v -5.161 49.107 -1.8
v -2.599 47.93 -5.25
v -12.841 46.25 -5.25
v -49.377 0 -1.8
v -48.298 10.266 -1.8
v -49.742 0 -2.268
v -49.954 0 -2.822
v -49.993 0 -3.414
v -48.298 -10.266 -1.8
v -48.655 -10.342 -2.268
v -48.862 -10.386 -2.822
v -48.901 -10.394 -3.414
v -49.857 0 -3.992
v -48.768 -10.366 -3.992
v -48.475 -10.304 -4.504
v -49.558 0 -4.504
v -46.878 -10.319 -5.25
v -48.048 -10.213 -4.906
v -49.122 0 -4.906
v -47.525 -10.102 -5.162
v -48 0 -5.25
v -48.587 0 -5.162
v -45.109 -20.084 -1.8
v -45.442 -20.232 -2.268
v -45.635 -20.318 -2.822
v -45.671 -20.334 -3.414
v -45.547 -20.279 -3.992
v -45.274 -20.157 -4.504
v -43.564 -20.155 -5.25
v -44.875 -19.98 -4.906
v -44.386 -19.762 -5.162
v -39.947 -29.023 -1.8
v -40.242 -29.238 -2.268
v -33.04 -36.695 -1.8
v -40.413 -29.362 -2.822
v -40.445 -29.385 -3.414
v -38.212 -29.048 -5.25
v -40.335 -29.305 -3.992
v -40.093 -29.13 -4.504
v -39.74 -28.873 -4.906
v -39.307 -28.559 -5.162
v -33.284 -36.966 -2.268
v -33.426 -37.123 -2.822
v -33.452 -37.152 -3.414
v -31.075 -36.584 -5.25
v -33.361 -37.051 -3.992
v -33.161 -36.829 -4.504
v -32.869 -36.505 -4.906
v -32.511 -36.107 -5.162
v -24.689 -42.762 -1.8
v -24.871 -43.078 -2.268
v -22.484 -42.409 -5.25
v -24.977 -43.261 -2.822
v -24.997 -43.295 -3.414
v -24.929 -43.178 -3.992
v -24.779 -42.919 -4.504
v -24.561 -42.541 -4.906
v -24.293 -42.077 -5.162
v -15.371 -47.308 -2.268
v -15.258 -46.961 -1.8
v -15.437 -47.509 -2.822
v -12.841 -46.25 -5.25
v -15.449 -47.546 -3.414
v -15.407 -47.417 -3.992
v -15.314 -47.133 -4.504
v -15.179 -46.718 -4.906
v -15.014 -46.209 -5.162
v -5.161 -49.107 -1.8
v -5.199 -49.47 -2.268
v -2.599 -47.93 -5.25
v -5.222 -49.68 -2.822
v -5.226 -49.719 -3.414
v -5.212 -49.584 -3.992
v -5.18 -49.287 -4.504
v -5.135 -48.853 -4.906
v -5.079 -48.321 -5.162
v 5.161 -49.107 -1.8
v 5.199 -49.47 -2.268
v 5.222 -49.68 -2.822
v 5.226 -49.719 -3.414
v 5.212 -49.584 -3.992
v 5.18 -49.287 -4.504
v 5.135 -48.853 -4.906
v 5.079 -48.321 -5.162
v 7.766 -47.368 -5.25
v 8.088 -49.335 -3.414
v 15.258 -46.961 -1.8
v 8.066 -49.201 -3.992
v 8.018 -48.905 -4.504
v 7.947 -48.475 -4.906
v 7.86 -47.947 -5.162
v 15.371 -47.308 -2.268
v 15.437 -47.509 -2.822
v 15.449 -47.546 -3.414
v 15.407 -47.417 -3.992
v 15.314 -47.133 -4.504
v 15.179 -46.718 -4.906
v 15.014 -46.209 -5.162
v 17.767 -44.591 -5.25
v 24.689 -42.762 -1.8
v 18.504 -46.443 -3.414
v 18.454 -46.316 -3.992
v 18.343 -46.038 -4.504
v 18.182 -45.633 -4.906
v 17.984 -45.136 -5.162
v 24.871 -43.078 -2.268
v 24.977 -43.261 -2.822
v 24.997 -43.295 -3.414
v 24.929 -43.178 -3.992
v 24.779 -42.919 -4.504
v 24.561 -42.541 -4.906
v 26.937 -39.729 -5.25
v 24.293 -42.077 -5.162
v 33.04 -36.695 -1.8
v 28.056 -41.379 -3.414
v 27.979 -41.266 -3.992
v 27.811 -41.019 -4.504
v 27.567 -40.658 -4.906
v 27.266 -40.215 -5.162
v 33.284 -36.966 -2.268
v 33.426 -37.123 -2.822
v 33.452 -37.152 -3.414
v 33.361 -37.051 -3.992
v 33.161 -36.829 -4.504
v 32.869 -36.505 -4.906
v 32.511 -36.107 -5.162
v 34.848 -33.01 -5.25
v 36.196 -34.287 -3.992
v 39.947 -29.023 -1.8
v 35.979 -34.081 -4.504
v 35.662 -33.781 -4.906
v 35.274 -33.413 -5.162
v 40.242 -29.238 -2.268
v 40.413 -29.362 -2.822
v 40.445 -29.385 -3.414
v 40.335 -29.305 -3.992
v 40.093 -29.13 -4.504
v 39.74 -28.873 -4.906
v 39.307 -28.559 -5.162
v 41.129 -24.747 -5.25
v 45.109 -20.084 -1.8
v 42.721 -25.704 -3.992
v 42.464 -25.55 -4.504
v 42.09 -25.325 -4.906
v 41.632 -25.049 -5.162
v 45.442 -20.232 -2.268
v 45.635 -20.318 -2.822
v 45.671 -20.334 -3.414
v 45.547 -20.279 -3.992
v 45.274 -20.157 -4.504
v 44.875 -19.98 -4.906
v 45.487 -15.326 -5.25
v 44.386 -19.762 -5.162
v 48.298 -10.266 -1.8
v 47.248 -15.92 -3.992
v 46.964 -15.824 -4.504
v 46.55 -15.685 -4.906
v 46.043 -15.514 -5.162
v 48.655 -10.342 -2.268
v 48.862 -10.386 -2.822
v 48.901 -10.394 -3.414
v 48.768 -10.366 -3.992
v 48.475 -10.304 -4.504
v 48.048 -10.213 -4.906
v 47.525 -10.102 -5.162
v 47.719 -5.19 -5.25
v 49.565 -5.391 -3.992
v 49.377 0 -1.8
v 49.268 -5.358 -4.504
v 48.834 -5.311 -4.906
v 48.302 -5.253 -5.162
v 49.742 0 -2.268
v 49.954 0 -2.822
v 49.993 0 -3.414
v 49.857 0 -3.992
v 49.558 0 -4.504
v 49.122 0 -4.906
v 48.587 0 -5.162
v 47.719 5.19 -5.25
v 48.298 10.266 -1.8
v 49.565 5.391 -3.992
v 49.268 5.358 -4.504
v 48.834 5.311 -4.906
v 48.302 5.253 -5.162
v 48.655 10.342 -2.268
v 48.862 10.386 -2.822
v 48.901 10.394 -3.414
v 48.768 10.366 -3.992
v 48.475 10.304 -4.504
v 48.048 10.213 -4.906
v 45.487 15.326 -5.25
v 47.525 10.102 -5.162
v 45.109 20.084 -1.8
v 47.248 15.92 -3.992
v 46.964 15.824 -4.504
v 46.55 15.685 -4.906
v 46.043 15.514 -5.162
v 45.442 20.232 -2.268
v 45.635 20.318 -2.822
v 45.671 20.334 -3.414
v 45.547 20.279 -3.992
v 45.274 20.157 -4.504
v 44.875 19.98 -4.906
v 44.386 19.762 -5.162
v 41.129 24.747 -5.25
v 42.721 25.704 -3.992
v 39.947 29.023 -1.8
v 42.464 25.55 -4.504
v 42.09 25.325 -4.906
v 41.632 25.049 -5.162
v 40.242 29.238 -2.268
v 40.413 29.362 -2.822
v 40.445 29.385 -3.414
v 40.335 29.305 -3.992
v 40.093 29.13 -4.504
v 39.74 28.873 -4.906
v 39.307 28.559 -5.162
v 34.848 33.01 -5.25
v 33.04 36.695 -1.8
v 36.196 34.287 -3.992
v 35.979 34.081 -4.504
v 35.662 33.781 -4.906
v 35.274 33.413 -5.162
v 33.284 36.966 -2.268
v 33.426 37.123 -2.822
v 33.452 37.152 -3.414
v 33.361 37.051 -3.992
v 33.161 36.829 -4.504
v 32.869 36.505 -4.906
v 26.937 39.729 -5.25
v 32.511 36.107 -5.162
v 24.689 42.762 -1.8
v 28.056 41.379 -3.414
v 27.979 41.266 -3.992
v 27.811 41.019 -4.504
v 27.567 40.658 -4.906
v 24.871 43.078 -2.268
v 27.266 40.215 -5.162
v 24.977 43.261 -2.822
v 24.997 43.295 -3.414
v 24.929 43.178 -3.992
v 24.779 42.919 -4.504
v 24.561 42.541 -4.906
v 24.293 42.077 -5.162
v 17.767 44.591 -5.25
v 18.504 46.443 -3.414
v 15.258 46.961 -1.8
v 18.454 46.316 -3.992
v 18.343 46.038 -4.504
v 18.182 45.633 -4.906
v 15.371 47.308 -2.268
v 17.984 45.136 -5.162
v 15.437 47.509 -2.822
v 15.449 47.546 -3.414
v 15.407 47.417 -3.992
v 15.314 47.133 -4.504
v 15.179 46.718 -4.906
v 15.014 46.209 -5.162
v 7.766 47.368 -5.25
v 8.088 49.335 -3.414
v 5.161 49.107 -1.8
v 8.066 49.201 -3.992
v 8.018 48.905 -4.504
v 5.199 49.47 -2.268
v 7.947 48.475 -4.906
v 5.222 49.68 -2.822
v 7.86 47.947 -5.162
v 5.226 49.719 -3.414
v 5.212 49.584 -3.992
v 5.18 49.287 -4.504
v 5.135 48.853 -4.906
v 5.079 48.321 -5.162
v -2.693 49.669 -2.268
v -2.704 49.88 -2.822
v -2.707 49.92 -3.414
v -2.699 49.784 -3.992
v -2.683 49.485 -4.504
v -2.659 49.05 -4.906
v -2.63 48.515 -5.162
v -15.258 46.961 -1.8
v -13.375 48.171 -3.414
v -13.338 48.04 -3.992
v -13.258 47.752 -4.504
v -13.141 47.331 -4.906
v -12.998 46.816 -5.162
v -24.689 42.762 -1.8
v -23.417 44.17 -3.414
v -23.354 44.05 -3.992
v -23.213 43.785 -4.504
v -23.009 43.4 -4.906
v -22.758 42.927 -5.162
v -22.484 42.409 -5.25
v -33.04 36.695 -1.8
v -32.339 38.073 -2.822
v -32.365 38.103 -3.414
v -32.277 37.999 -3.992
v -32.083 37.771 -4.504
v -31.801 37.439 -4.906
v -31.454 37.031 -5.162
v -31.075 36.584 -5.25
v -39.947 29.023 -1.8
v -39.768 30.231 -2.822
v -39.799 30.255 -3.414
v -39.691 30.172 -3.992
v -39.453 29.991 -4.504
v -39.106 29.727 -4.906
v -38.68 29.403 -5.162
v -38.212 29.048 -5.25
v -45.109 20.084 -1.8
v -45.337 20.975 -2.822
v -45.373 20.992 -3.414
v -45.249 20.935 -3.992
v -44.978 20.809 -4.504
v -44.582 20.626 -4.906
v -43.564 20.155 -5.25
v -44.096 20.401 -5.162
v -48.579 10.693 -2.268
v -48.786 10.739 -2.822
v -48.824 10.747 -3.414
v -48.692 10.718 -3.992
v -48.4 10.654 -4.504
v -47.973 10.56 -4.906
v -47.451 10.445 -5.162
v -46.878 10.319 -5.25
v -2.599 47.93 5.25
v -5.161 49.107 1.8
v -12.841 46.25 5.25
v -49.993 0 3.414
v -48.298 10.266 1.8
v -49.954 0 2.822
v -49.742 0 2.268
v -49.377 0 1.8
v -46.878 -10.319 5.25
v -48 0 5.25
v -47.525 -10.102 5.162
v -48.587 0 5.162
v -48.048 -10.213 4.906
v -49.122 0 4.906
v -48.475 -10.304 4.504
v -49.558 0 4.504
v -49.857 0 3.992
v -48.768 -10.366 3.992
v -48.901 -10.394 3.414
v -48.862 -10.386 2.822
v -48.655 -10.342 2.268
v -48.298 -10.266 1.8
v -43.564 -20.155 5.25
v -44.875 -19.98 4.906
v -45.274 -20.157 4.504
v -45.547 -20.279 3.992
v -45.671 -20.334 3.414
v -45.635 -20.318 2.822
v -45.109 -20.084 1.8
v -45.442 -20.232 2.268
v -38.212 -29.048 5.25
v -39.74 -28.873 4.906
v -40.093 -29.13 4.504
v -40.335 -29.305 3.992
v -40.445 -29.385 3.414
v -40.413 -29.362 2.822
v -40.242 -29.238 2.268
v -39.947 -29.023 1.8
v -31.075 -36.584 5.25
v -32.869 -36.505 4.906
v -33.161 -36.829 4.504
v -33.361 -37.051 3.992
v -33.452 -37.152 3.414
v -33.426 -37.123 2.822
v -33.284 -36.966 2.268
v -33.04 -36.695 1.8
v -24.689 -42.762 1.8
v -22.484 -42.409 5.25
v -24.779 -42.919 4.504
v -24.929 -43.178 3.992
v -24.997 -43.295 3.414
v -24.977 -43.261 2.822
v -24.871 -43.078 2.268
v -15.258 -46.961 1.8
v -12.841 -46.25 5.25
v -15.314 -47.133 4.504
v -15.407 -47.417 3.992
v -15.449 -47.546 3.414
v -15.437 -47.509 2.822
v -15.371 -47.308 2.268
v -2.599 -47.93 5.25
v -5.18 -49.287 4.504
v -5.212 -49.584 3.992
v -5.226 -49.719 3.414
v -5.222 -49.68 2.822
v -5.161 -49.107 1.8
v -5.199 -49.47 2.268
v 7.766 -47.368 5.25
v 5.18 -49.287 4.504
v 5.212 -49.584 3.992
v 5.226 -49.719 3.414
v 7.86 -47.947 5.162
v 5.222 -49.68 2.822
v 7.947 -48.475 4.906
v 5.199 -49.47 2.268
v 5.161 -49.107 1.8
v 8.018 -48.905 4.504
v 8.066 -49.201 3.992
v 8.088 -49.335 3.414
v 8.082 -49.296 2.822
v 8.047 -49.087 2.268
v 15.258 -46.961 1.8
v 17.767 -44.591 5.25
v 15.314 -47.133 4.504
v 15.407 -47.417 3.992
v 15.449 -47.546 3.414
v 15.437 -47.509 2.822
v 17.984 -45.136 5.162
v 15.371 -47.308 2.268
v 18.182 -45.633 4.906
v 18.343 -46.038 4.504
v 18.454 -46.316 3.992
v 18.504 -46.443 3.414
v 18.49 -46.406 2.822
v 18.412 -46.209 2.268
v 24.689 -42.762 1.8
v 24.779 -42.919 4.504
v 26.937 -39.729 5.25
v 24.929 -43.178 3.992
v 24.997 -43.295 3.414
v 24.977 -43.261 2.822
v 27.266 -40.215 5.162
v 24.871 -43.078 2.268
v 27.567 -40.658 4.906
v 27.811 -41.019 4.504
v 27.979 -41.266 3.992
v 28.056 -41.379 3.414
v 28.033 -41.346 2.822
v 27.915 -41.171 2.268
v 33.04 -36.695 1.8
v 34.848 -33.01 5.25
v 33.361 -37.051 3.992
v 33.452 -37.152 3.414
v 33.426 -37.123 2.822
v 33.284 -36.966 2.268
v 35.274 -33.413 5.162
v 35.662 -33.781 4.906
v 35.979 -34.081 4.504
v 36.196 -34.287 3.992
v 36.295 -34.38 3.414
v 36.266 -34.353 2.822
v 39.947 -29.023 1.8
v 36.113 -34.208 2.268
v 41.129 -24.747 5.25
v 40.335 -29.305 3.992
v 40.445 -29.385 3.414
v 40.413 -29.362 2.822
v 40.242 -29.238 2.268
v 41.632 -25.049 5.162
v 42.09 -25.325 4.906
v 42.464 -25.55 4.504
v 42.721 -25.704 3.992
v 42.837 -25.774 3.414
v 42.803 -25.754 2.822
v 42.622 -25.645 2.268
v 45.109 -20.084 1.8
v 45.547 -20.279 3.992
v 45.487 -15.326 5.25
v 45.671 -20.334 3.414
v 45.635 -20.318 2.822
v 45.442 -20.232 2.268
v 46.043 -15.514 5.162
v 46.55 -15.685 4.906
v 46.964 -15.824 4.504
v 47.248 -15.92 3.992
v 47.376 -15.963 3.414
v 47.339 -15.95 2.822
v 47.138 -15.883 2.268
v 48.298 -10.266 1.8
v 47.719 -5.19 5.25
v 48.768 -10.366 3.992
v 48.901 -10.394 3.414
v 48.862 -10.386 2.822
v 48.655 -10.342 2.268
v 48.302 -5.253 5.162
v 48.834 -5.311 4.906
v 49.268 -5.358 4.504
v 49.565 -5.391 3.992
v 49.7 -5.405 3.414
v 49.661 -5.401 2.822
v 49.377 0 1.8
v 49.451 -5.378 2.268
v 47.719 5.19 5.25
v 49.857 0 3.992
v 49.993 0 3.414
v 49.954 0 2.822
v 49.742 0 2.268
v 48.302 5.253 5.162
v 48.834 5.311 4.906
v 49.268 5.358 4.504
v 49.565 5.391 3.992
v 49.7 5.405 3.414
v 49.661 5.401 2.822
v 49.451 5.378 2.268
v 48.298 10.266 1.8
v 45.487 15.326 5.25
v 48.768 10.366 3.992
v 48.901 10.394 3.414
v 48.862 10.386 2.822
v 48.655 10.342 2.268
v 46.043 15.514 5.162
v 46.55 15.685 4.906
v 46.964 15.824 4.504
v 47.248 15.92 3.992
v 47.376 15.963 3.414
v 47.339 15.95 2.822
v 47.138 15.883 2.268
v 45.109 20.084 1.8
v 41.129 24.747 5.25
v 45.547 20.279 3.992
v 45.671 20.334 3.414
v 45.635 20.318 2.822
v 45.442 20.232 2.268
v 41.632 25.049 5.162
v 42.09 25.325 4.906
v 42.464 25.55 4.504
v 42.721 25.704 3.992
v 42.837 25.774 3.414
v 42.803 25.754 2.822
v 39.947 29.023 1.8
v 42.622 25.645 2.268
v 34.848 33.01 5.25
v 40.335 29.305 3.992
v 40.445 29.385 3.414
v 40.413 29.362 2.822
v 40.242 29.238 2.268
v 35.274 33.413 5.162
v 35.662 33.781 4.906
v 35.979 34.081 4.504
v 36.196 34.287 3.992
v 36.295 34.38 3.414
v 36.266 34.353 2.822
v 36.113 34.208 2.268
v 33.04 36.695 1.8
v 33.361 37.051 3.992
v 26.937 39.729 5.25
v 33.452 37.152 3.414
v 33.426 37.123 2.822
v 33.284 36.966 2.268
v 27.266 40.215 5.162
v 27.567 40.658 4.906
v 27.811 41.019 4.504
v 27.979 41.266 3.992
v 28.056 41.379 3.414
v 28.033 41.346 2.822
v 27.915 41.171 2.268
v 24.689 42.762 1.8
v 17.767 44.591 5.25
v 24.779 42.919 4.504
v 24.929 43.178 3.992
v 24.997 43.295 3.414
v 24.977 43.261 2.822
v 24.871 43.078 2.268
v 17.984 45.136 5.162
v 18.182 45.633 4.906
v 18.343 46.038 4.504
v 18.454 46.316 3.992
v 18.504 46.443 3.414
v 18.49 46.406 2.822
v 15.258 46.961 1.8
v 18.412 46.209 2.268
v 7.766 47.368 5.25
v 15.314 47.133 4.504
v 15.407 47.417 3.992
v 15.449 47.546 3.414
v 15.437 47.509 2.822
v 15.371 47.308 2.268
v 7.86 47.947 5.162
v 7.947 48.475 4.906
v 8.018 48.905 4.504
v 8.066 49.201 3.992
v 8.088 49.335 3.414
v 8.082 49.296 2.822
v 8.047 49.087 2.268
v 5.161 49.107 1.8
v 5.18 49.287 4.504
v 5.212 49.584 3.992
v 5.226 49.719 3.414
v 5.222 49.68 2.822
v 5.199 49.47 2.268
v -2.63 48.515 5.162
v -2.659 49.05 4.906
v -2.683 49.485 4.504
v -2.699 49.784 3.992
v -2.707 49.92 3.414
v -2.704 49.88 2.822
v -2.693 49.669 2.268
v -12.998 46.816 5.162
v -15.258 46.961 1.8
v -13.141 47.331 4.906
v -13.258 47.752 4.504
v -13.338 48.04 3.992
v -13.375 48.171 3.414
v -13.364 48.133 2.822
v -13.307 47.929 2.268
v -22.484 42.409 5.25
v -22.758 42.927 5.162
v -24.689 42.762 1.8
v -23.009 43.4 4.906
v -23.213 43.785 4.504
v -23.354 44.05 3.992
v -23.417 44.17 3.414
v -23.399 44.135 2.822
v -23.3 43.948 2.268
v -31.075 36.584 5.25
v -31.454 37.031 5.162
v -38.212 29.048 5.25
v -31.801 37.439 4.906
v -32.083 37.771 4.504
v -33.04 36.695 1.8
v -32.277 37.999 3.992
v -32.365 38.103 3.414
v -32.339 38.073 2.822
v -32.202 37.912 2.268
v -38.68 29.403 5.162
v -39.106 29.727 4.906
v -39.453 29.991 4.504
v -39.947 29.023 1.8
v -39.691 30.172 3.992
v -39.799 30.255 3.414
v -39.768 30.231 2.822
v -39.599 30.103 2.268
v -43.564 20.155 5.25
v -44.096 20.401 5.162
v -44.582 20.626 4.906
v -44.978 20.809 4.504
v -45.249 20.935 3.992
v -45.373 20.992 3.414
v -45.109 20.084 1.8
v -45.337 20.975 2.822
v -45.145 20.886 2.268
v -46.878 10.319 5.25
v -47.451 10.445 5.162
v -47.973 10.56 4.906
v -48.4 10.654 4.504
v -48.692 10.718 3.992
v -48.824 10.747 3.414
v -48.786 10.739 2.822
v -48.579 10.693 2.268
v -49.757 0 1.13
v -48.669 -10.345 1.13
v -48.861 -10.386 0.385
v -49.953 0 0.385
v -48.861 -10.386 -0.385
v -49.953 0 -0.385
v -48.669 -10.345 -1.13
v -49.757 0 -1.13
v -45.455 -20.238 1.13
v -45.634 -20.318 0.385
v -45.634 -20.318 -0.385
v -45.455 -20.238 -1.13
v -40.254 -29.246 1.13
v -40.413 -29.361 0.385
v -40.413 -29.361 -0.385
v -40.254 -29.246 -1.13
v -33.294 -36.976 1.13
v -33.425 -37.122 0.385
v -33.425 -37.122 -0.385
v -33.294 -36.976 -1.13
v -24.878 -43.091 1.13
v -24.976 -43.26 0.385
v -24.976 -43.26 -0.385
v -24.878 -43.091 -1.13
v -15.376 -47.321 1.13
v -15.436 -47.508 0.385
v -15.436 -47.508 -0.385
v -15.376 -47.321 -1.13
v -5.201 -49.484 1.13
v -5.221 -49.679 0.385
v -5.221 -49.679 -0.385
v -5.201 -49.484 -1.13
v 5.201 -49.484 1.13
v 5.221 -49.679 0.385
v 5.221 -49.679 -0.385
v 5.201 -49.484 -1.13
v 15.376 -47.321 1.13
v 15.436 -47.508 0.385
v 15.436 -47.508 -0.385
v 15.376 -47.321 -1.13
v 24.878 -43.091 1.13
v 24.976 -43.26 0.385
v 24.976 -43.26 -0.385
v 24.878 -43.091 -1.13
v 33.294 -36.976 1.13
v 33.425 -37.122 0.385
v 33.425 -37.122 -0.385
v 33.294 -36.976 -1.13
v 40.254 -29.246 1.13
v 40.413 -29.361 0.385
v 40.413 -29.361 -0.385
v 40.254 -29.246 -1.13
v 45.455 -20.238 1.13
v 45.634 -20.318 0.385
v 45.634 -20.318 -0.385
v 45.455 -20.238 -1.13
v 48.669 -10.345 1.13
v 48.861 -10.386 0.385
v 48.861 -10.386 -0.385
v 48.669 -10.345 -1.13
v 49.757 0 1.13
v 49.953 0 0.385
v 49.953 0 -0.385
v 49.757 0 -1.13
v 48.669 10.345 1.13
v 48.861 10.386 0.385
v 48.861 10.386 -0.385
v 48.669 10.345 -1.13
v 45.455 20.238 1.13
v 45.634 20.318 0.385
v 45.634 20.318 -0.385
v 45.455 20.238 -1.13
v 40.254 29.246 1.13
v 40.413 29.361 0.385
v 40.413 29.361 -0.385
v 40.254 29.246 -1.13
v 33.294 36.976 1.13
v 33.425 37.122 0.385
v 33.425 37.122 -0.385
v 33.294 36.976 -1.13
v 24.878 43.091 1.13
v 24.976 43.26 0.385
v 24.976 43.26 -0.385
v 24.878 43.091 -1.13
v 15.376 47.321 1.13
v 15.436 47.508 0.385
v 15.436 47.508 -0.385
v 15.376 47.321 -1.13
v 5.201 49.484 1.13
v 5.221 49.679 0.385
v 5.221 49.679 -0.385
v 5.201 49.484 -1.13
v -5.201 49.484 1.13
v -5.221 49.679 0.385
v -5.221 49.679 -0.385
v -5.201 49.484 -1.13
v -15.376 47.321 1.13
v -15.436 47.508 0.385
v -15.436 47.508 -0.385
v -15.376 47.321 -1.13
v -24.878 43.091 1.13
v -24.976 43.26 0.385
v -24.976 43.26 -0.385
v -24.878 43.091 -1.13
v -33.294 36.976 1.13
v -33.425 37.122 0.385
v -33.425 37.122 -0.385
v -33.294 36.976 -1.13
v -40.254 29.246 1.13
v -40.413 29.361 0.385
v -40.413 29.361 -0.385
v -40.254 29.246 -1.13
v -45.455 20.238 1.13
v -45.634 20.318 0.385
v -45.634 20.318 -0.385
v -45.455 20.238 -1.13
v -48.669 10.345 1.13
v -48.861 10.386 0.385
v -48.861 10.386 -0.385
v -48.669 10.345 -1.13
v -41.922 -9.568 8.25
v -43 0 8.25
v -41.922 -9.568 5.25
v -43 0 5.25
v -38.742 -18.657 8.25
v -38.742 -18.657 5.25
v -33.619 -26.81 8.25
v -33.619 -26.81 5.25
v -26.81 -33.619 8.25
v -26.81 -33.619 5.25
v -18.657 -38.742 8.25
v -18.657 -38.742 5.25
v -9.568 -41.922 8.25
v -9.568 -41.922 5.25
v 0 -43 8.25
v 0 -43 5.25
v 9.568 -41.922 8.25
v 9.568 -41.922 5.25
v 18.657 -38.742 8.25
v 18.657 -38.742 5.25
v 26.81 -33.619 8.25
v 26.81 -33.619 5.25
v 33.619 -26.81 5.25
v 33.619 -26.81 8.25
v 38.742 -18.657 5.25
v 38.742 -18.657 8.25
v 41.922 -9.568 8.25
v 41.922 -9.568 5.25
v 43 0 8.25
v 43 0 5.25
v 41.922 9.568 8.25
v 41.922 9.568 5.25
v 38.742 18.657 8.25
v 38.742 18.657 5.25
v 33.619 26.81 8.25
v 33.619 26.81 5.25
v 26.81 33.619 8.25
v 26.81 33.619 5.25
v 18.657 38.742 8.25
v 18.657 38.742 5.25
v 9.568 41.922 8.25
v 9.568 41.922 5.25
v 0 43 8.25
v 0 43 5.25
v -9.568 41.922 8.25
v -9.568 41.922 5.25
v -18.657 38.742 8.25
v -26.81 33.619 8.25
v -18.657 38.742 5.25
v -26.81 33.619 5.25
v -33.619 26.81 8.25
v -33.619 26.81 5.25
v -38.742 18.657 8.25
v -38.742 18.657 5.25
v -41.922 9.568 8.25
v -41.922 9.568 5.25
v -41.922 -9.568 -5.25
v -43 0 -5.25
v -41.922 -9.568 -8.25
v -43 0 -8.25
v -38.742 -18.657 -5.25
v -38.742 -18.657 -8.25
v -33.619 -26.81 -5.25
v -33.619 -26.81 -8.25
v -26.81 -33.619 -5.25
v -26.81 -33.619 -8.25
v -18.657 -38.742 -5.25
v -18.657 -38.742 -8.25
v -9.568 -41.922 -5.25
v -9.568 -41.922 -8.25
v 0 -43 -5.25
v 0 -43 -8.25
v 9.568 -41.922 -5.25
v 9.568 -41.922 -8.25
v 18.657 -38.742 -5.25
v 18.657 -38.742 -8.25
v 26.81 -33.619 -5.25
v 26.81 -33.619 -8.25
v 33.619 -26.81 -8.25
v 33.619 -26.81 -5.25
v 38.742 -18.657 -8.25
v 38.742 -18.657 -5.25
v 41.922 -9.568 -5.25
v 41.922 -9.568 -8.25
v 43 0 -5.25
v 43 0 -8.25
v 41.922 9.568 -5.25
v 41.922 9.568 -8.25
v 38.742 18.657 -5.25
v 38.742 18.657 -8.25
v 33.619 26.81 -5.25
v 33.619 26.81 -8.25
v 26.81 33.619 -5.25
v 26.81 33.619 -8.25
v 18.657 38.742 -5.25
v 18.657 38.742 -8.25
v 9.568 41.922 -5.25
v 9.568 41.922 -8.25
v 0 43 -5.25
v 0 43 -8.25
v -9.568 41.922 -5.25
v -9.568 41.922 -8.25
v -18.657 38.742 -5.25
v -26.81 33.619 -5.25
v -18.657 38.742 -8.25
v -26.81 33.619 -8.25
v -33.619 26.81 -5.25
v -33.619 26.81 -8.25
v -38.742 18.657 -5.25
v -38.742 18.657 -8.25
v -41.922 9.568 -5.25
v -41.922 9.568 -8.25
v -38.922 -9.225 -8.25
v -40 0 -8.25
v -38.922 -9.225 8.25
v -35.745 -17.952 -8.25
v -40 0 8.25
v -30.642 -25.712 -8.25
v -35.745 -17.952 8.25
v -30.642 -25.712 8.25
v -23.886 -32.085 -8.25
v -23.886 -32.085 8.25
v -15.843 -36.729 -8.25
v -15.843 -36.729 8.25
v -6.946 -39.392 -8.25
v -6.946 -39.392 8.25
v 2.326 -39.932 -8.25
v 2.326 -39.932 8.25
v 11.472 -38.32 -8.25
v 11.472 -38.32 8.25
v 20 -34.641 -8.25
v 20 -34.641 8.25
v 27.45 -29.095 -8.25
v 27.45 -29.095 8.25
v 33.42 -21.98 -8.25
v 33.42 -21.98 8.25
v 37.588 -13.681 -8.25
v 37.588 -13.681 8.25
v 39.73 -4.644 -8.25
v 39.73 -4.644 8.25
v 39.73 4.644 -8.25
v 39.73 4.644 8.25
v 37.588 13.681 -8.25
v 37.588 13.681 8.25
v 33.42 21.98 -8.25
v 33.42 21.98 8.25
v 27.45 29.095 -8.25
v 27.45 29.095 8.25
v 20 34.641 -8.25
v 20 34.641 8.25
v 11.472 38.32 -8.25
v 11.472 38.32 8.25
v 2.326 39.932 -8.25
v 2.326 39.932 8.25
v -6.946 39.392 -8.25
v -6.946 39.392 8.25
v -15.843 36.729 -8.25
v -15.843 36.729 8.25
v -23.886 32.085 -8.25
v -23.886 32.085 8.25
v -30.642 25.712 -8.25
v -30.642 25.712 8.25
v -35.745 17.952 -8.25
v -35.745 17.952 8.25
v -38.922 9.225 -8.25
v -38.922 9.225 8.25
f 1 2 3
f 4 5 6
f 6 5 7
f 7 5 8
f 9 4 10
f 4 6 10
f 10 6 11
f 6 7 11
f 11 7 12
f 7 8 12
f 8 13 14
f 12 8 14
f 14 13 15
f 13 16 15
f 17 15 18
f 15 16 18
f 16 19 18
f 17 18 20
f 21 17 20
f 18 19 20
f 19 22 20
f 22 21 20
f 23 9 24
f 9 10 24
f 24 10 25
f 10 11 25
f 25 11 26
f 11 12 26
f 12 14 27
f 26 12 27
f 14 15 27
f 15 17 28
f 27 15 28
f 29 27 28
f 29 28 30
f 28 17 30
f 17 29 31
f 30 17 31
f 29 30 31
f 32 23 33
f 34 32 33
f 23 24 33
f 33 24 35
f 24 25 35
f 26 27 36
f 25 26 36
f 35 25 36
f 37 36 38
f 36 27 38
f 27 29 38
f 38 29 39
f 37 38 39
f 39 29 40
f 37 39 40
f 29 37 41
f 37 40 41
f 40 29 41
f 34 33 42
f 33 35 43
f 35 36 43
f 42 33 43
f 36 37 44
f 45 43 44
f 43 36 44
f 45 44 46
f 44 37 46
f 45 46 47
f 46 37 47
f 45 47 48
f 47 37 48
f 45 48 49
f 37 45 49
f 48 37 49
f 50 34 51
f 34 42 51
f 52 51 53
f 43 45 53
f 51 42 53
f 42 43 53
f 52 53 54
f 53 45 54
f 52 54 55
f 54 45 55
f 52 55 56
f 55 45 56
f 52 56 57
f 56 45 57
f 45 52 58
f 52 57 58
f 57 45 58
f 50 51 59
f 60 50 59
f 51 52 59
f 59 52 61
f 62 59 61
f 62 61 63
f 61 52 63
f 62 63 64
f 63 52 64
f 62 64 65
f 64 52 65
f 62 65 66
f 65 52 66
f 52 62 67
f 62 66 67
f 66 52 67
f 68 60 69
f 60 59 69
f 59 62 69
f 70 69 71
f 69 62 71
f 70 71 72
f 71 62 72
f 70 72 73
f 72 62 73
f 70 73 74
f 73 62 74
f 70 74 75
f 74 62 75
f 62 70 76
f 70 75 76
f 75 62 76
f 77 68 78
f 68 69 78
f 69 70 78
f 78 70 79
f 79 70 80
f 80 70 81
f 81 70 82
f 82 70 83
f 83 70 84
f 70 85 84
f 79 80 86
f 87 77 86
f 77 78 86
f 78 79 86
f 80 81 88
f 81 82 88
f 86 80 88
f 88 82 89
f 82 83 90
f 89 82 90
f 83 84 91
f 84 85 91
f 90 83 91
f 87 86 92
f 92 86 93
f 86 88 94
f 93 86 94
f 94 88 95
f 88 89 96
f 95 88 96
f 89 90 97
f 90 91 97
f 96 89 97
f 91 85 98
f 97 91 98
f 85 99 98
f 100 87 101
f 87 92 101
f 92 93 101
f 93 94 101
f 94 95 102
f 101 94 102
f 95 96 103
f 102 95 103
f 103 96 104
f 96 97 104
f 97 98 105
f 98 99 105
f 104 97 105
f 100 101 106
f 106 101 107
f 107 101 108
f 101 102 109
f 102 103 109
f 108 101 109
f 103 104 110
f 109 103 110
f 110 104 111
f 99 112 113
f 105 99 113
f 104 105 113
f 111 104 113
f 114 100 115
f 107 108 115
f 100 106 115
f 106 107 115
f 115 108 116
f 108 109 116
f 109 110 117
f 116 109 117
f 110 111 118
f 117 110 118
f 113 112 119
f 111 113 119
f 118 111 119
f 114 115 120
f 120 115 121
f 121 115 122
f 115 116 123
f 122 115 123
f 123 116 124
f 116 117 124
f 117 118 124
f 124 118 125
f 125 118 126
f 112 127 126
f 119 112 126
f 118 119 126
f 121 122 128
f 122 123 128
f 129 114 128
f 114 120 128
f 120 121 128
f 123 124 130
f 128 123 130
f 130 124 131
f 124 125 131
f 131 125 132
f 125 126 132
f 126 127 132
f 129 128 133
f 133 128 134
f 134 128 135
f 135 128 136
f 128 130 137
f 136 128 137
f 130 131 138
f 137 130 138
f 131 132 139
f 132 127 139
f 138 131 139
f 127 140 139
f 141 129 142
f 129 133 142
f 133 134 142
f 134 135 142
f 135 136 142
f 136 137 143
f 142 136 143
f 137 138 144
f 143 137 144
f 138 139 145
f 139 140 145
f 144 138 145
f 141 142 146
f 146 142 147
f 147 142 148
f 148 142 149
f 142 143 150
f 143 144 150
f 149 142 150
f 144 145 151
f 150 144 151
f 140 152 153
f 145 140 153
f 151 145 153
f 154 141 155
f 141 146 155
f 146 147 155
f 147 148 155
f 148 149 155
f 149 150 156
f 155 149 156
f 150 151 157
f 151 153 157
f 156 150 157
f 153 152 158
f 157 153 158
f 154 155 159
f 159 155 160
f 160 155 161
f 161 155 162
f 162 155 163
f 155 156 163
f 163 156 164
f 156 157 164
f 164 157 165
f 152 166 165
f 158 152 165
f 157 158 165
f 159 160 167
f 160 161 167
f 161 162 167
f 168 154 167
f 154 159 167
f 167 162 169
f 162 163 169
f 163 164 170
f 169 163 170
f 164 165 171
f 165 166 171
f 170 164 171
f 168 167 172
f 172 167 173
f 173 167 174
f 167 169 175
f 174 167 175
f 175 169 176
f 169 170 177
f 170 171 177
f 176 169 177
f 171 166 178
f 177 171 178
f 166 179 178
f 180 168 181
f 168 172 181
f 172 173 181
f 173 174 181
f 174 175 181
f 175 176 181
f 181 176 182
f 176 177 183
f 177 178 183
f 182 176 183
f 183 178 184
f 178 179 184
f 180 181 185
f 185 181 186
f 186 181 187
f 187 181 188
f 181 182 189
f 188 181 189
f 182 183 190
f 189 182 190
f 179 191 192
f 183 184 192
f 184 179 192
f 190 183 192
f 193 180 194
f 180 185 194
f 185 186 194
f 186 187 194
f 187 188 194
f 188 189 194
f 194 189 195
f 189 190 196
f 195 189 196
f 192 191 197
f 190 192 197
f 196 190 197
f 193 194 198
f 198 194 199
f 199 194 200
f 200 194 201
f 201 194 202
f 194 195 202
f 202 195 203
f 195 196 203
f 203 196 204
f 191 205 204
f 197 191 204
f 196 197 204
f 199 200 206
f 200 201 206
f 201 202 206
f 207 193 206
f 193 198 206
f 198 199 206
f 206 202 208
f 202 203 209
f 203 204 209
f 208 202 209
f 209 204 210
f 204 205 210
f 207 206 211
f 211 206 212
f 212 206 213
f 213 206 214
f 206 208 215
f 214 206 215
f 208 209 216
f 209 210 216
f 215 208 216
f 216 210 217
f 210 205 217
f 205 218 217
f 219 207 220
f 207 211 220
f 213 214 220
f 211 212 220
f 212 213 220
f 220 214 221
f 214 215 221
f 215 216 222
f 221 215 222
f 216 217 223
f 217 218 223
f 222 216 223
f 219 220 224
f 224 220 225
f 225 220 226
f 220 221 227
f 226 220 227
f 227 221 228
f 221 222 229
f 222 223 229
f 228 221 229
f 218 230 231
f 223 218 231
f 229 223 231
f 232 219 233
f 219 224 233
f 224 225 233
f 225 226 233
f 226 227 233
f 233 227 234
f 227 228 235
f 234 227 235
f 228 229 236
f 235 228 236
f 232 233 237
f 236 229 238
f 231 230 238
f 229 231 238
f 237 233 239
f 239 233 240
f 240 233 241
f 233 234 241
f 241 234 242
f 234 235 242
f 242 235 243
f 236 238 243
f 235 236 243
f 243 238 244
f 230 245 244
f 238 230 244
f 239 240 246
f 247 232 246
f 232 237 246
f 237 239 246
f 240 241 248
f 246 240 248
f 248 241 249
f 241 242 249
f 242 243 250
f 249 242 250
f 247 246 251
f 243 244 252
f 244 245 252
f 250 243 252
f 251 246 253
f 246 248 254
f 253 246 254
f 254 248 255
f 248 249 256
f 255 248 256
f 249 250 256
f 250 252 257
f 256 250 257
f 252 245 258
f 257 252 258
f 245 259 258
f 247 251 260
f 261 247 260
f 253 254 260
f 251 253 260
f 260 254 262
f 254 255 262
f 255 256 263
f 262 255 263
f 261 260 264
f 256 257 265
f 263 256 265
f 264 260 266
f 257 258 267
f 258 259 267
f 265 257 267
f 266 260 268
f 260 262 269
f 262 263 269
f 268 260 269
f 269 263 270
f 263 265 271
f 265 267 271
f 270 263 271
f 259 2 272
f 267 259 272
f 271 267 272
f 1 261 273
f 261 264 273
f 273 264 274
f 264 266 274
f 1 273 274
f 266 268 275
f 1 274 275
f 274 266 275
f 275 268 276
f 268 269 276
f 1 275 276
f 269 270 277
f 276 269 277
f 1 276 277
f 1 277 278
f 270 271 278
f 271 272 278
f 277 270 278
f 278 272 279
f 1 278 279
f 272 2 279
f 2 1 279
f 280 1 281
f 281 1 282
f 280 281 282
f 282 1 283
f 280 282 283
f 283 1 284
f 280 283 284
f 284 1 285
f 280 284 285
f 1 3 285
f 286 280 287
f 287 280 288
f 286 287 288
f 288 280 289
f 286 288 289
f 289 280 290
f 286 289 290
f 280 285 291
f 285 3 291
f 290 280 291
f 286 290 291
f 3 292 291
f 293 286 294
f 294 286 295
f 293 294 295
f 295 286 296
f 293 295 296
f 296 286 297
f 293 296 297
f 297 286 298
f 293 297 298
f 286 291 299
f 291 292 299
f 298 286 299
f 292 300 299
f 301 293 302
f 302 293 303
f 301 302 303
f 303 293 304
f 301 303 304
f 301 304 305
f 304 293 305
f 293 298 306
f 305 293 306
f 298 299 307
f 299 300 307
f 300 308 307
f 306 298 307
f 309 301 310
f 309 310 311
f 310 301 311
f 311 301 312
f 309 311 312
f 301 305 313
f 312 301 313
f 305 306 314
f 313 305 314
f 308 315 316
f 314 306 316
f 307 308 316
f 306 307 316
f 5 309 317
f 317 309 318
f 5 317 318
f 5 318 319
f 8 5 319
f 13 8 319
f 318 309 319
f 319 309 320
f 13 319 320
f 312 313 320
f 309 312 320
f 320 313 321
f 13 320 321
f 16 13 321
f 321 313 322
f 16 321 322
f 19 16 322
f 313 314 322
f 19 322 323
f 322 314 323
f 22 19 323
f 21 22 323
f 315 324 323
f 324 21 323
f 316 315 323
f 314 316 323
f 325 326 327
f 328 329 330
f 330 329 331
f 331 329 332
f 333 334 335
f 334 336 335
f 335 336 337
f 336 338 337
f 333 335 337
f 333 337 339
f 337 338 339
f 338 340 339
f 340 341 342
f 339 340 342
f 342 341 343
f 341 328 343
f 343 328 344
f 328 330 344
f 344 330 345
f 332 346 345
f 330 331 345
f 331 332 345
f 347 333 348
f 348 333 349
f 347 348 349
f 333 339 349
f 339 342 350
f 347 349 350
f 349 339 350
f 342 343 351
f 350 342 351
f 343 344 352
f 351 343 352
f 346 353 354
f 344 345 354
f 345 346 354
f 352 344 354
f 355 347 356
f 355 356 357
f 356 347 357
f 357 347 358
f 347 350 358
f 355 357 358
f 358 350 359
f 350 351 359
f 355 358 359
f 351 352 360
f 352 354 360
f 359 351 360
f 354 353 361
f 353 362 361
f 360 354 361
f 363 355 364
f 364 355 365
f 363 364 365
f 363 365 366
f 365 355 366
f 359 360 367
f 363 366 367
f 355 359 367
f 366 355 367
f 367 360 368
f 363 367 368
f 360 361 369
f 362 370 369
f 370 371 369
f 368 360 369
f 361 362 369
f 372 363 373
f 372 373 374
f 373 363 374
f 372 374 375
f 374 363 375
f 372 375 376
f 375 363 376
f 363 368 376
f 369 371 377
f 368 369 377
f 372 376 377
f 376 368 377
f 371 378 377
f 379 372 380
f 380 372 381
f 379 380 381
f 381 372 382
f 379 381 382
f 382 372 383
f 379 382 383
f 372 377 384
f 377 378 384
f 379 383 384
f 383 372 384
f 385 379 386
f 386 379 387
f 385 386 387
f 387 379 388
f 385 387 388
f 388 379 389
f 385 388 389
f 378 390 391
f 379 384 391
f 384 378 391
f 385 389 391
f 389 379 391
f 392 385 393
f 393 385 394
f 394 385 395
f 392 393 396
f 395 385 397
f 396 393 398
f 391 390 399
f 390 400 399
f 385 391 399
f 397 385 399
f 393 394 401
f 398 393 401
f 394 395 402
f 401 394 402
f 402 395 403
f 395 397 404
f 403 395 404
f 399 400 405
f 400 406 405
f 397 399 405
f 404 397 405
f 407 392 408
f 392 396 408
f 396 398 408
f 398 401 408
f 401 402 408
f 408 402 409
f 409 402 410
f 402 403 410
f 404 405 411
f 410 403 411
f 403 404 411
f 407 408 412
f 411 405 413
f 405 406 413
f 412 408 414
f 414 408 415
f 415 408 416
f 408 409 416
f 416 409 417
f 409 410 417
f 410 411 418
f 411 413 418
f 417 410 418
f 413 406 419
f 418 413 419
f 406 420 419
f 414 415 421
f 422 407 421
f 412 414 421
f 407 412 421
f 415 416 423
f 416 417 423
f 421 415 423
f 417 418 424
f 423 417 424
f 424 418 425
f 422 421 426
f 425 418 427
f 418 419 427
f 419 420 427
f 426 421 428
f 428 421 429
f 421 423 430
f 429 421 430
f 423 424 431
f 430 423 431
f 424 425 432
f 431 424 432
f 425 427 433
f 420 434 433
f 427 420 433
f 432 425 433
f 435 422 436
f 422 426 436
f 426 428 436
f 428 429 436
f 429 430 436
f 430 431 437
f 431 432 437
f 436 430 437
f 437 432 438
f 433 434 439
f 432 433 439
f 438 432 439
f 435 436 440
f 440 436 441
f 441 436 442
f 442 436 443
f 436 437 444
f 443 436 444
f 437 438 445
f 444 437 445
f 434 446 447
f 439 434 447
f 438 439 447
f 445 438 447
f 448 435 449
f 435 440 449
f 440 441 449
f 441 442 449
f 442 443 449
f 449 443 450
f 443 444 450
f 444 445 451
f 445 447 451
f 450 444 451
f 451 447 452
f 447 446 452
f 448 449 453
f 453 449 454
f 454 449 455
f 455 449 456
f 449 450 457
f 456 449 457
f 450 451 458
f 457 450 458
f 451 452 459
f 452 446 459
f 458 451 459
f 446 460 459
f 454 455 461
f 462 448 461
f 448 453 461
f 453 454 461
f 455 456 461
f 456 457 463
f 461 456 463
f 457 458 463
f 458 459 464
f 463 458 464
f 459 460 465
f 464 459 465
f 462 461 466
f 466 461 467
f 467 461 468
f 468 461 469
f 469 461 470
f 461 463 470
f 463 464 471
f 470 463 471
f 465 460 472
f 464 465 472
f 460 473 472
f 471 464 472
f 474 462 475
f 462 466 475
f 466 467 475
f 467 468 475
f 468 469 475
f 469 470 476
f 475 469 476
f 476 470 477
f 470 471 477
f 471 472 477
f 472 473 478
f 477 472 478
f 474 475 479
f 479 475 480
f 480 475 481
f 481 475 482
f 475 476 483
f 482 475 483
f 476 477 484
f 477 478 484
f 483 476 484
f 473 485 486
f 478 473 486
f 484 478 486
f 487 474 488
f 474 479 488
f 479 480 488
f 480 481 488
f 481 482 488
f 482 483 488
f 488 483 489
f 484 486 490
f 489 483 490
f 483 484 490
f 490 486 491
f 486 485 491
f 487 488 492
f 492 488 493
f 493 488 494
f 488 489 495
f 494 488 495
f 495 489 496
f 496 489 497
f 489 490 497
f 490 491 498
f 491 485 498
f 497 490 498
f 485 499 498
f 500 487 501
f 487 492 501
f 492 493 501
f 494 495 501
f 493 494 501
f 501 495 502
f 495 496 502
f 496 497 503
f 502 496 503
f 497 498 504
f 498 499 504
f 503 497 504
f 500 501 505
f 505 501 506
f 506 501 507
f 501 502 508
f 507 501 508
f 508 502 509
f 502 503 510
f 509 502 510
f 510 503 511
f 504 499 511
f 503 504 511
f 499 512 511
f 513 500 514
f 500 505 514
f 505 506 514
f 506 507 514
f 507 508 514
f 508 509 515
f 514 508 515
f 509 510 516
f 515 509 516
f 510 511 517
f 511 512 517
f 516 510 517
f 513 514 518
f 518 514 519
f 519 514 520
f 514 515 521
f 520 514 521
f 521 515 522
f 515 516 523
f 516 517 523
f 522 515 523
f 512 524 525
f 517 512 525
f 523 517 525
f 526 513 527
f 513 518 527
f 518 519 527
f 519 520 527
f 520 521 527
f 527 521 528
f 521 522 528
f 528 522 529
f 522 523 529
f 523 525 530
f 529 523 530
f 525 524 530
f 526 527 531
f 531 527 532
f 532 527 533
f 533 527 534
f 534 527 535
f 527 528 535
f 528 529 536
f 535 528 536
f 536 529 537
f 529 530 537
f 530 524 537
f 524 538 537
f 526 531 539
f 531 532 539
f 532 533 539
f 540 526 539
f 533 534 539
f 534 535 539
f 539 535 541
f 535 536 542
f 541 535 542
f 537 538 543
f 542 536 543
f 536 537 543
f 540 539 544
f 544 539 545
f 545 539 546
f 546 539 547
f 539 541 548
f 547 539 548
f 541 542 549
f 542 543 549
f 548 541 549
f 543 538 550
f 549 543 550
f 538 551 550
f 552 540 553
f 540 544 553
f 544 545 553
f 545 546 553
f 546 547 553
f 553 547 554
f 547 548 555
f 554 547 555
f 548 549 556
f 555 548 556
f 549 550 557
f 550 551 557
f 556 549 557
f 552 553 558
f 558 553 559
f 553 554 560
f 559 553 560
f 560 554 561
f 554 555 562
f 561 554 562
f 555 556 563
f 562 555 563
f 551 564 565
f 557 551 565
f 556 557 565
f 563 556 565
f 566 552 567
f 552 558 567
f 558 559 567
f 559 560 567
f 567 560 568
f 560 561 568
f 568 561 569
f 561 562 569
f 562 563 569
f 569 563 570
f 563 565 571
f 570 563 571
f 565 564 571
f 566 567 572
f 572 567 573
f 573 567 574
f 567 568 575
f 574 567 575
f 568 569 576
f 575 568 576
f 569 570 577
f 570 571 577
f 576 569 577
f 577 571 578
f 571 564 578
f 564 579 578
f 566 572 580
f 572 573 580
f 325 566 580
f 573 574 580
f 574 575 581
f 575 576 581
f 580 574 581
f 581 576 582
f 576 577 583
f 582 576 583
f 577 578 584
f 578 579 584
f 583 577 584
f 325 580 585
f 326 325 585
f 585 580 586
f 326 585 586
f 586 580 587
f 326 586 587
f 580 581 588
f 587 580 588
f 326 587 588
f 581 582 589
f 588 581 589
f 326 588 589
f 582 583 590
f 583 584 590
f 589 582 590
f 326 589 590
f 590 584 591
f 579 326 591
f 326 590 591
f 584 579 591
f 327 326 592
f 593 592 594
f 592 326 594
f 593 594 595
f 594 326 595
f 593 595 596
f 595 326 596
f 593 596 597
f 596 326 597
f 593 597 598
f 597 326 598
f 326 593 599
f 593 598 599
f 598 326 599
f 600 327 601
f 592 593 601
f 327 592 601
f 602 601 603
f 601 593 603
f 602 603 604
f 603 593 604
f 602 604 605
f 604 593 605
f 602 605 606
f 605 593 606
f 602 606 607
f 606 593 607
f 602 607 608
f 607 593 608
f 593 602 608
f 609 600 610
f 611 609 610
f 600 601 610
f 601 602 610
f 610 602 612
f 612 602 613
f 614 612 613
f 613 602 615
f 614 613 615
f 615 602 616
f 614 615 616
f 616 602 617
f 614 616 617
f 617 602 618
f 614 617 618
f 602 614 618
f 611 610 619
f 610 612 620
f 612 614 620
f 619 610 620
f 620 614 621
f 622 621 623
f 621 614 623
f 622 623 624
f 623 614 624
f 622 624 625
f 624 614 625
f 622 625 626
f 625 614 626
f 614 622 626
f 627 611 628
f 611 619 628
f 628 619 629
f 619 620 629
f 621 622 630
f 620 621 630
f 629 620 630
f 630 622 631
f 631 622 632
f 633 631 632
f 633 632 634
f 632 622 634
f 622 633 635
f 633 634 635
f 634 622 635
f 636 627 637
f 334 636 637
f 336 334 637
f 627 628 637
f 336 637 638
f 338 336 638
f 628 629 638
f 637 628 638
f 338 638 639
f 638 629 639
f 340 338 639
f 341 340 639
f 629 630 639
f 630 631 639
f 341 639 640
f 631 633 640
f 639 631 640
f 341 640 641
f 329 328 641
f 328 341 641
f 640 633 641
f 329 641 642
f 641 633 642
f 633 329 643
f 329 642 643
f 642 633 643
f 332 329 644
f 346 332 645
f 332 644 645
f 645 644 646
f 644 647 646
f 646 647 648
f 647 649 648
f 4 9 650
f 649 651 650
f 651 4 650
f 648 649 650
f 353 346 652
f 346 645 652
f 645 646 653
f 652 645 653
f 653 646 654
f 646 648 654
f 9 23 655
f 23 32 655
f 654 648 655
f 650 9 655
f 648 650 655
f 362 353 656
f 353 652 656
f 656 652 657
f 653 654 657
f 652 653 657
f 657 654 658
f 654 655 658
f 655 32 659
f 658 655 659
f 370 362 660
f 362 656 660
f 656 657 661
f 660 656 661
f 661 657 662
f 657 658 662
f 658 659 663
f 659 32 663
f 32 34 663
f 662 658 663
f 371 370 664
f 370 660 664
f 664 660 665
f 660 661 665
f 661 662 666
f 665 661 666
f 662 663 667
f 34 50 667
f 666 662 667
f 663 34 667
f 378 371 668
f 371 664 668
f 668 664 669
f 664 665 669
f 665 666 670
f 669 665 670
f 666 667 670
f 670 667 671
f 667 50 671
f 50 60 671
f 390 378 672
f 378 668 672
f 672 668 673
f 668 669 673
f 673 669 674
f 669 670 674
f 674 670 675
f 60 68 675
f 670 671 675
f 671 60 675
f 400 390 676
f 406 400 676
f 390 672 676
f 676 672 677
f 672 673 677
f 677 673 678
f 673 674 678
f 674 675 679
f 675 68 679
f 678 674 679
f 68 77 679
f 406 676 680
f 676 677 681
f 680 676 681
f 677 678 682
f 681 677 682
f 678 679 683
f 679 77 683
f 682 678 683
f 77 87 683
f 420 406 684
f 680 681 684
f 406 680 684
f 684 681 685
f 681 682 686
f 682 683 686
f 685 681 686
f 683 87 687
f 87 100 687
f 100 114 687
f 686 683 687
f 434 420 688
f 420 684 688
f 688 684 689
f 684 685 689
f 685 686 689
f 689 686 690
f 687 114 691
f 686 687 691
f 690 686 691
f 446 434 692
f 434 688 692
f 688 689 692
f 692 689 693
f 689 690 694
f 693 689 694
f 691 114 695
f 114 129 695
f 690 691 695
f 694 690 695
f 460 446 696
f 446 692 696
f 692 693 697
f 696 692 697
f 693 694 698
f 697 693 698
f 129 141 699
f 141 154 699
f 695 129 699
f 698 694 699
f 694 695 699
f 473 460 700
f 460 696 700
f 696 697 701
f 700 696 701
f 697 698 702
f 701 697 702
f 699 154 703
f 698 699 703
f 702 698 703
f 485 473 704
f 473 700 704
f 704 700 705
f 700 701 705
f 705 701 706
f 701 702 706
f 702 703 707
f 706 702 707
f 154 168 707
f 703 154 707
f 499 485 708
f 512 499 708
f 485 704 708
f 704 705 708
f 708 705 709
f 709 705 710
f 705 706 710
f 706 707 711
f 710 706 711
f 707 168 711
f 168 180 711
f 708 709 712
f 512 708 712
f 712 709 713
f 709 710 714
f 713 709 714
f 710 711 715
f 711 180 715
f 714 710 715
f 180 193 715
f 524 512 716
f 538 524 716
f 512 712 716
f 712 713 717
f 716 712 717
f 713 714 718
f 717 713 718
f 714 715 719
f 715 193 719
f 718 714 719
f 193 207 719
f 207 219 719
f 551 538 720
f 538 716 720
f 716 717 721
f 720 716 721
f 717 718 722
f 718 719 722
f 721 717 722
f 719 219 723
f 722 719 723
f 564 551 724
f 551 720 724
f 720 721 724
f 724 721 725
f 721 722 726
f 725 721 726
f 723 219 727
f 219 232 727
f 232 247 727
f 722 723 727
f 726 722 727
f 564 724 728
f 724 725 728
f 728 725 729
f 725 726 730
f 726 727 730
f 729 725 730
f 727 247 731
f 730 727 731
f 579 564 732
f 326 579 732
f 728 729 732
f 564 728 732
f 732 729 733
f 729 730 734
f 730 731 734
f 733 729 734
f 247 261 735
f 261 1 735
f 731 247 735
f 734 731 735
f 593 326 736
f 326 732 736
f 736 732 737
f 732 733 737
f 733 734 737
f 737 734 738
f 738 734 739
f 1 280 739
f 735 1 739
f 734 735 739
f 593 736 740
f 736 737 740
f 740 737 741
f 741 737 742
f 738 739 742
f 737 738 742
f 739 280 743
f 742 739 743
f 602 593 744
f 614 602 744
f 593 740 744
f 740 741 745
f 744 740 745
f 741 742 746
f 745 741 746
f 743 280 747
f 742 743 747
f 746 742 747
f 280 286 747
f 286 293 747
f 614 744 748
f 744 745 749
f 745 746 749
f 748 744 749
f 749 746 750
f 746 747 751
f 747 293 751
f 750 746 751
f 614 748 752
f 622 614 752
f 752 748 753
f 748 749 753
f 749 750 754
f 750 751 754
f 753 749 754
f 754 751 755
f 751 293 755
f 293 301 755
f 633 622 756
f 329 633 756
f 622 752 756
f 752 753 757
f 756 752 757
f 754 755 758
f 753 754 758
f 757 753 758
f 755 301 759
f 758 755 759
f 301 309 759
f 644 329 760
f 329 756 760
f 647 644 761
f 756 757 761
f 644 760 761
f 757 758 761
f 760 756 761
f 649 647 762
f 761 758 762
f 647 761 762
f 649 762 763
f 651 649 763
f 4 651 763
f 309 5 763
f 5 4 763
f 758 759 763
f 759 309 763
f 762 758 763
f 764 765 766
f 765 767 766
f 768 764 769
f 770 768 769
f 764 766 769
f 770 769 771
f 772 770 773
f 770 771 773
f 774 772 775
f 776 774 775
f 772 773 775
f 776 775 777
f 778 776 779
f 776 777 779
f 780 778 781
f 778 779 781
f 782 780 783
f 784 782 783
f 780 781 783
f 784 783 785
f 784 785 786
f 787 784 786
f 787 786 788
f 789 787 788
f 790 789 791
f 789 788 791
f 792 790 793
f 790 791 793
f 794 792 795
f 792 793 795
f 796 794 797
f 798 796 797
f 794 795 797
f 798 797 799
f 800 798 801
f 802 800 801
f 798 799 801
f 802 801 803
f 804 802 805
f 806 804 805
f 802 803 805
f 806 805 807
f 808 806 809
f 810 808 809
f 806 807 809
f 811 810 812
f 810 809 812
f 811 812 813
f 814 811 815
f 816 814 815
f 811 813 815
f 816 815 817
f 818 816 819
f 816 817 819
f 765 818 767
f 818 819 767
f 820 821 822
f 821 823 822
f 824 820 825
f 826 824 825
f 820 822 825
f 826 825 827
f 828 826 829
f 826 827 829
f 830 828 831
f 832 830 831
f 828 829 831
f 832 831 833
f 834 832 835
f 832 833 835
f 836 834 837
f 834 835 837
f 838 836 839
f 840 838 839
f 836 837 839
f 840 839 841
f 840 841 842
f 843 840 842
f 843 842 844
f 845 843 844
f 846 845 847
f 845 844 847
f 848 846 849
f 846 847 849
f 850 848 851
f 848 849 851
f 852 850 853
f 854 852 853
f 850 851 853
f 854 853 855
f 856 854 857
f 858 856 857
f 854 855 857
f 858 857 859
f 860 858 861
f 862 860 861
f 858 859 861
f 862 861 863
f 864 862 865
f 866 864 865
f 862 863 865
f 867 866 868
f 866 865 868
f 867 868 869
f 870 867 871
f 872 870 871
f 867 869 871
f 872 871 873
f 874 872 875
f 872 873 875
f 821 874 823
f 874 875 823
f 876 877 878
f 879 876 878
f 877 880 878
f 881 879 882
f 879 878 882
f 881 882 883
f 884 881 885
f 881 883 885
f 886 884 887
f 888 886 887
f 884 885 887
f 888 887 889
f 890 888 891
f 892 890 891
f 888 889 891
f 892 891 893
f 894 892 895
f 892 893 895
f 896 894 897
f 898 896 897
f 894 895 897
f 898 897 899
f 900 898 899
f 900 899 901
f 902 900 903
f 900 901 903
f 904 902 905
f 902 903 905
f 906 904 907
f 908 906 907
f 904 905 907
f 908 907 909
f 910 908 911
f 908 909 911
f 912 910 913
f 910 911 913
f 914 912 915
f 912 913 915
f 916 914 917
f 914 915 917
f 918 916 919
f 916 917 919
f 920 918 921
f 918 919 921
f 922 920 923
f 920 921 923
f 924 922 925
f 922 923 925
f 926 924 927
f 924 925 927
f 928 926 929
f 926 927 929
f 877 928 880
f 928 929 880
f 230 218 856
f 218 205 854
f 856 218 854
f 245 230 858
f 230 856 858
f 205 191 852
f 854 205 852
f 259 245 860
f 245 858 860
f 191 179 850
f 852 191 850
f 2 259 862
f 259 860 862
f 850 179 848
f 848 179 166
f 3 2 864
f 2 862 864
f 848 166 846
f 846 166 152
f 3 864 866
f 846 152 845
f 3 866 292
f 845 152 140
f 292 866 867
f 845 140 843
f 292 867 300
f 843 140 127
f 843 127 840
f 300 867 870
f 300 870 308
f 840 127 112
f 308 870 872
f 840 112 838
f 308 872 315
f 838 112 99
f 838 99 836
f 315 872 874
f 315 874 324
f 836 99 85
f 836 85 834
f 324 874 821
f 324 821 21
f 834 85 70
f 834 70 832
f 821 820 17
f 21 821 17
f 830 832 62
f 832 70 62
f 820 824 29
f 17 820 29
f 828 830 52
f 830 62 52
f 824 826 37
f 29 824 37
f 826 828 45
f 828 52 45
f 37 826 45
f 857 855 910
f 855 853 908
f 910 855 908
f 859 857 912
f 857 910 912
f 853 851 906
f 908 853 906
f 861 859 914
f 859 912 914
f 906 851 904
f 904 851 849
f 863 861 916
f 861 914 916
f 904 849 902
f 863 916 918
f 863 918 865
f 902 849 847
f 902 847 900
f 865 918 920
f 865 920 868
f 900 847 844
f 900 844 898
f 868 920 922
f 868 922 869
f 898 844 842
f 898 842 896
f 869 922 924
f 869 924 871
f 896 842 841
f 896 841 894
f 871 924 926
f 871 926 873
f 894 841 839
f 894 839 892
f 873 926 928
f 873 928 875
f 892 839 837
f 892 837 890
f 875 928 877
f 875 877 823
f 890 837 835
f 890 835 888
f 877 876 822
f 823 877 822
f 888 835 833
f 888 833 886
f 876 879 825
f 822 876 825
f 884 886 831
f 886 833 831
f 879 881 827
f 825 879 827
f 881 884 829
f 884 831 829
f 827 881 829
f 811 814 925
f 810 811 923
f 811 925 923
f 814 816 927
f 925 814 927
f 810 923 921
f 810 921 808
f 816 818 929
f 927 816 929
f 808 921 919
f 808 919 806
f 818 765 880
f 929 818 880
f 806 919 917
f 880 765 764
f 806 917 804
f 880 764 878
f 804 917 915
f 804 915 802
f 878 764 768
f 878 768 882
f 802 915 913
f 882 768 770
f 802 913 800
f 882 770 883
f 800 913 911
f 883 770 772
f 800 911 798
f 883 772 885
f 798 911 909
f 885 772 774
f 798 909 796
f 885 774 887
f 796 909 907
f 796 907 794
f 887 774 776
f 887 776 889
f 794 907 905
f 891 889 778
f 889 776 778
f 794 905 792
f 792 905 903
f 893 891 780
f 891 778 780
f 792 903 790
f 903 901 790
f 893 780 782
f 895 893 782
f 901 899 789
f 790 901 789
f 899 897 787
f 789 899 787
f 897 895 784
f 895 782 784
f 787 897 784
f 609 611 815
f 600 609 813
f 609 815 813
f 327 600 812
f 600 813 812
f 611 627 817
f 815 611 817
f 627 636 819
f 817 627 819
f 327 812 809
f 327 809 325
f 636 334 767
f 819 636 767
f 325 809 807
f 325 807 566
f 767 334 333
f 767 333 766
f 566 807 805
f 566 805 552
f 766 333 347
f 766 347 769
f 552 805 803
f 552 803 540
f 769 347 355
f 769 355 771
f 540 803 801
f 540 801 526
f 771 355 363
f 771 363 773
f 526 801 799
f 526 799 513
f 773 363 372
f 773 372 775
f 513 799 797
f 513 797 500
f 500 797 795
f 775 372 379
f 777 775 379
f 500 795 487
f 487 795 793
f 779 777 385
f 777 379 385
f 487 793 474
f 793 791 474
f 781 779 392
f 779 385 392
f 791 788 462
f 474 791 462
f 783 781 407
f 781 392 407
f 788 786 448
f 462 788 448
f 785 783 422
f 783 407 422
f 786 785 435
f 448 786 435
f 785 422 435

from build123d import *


with BuildPart() as part:
    # Sketch1 → Revolve1 (revolve)
    with BuildSketch(Plane(origin=(0, 0, 0), x_dir=(0, 0, -1), z_dir=(1, 0, 0)), mode=Mode.PRIVATE) as revolve1_sk:
        with BuildLine():
            Line((8.25, 40), (-8.25, 40))
            Line((-8.25, 40), (-8.25, 43))
            Line((-8.25, 43), (-5.25, 43))
            Line((-5.25, 43), (-5.25, 48))
            ThreePointArc((-5.25, 48), (-3.991619849, 49.857417562), (-1.8, 49.377497731))
            ThreePointArc((-1.8, 49.377497731), (0, 49.977497731), (1.8, 49.377497731))
            ThreePointArc((1.8, 49.377497731), (3.991619849, 49.857417562), (5.25, 48))
            Line((5.25, 48), (5.25, 43))
            Line((5.25, 43), (8.25, 43))
            Line((8.25, 43), (8.25, 40))
        make_face()
    revolve(revolve1_sk.sketch.rotate(Axis((0, 0, 0), (0, 0, 1)), 90), axis=Axis((0, 0, 0), (0, 0, 1)))


solid = part.part
